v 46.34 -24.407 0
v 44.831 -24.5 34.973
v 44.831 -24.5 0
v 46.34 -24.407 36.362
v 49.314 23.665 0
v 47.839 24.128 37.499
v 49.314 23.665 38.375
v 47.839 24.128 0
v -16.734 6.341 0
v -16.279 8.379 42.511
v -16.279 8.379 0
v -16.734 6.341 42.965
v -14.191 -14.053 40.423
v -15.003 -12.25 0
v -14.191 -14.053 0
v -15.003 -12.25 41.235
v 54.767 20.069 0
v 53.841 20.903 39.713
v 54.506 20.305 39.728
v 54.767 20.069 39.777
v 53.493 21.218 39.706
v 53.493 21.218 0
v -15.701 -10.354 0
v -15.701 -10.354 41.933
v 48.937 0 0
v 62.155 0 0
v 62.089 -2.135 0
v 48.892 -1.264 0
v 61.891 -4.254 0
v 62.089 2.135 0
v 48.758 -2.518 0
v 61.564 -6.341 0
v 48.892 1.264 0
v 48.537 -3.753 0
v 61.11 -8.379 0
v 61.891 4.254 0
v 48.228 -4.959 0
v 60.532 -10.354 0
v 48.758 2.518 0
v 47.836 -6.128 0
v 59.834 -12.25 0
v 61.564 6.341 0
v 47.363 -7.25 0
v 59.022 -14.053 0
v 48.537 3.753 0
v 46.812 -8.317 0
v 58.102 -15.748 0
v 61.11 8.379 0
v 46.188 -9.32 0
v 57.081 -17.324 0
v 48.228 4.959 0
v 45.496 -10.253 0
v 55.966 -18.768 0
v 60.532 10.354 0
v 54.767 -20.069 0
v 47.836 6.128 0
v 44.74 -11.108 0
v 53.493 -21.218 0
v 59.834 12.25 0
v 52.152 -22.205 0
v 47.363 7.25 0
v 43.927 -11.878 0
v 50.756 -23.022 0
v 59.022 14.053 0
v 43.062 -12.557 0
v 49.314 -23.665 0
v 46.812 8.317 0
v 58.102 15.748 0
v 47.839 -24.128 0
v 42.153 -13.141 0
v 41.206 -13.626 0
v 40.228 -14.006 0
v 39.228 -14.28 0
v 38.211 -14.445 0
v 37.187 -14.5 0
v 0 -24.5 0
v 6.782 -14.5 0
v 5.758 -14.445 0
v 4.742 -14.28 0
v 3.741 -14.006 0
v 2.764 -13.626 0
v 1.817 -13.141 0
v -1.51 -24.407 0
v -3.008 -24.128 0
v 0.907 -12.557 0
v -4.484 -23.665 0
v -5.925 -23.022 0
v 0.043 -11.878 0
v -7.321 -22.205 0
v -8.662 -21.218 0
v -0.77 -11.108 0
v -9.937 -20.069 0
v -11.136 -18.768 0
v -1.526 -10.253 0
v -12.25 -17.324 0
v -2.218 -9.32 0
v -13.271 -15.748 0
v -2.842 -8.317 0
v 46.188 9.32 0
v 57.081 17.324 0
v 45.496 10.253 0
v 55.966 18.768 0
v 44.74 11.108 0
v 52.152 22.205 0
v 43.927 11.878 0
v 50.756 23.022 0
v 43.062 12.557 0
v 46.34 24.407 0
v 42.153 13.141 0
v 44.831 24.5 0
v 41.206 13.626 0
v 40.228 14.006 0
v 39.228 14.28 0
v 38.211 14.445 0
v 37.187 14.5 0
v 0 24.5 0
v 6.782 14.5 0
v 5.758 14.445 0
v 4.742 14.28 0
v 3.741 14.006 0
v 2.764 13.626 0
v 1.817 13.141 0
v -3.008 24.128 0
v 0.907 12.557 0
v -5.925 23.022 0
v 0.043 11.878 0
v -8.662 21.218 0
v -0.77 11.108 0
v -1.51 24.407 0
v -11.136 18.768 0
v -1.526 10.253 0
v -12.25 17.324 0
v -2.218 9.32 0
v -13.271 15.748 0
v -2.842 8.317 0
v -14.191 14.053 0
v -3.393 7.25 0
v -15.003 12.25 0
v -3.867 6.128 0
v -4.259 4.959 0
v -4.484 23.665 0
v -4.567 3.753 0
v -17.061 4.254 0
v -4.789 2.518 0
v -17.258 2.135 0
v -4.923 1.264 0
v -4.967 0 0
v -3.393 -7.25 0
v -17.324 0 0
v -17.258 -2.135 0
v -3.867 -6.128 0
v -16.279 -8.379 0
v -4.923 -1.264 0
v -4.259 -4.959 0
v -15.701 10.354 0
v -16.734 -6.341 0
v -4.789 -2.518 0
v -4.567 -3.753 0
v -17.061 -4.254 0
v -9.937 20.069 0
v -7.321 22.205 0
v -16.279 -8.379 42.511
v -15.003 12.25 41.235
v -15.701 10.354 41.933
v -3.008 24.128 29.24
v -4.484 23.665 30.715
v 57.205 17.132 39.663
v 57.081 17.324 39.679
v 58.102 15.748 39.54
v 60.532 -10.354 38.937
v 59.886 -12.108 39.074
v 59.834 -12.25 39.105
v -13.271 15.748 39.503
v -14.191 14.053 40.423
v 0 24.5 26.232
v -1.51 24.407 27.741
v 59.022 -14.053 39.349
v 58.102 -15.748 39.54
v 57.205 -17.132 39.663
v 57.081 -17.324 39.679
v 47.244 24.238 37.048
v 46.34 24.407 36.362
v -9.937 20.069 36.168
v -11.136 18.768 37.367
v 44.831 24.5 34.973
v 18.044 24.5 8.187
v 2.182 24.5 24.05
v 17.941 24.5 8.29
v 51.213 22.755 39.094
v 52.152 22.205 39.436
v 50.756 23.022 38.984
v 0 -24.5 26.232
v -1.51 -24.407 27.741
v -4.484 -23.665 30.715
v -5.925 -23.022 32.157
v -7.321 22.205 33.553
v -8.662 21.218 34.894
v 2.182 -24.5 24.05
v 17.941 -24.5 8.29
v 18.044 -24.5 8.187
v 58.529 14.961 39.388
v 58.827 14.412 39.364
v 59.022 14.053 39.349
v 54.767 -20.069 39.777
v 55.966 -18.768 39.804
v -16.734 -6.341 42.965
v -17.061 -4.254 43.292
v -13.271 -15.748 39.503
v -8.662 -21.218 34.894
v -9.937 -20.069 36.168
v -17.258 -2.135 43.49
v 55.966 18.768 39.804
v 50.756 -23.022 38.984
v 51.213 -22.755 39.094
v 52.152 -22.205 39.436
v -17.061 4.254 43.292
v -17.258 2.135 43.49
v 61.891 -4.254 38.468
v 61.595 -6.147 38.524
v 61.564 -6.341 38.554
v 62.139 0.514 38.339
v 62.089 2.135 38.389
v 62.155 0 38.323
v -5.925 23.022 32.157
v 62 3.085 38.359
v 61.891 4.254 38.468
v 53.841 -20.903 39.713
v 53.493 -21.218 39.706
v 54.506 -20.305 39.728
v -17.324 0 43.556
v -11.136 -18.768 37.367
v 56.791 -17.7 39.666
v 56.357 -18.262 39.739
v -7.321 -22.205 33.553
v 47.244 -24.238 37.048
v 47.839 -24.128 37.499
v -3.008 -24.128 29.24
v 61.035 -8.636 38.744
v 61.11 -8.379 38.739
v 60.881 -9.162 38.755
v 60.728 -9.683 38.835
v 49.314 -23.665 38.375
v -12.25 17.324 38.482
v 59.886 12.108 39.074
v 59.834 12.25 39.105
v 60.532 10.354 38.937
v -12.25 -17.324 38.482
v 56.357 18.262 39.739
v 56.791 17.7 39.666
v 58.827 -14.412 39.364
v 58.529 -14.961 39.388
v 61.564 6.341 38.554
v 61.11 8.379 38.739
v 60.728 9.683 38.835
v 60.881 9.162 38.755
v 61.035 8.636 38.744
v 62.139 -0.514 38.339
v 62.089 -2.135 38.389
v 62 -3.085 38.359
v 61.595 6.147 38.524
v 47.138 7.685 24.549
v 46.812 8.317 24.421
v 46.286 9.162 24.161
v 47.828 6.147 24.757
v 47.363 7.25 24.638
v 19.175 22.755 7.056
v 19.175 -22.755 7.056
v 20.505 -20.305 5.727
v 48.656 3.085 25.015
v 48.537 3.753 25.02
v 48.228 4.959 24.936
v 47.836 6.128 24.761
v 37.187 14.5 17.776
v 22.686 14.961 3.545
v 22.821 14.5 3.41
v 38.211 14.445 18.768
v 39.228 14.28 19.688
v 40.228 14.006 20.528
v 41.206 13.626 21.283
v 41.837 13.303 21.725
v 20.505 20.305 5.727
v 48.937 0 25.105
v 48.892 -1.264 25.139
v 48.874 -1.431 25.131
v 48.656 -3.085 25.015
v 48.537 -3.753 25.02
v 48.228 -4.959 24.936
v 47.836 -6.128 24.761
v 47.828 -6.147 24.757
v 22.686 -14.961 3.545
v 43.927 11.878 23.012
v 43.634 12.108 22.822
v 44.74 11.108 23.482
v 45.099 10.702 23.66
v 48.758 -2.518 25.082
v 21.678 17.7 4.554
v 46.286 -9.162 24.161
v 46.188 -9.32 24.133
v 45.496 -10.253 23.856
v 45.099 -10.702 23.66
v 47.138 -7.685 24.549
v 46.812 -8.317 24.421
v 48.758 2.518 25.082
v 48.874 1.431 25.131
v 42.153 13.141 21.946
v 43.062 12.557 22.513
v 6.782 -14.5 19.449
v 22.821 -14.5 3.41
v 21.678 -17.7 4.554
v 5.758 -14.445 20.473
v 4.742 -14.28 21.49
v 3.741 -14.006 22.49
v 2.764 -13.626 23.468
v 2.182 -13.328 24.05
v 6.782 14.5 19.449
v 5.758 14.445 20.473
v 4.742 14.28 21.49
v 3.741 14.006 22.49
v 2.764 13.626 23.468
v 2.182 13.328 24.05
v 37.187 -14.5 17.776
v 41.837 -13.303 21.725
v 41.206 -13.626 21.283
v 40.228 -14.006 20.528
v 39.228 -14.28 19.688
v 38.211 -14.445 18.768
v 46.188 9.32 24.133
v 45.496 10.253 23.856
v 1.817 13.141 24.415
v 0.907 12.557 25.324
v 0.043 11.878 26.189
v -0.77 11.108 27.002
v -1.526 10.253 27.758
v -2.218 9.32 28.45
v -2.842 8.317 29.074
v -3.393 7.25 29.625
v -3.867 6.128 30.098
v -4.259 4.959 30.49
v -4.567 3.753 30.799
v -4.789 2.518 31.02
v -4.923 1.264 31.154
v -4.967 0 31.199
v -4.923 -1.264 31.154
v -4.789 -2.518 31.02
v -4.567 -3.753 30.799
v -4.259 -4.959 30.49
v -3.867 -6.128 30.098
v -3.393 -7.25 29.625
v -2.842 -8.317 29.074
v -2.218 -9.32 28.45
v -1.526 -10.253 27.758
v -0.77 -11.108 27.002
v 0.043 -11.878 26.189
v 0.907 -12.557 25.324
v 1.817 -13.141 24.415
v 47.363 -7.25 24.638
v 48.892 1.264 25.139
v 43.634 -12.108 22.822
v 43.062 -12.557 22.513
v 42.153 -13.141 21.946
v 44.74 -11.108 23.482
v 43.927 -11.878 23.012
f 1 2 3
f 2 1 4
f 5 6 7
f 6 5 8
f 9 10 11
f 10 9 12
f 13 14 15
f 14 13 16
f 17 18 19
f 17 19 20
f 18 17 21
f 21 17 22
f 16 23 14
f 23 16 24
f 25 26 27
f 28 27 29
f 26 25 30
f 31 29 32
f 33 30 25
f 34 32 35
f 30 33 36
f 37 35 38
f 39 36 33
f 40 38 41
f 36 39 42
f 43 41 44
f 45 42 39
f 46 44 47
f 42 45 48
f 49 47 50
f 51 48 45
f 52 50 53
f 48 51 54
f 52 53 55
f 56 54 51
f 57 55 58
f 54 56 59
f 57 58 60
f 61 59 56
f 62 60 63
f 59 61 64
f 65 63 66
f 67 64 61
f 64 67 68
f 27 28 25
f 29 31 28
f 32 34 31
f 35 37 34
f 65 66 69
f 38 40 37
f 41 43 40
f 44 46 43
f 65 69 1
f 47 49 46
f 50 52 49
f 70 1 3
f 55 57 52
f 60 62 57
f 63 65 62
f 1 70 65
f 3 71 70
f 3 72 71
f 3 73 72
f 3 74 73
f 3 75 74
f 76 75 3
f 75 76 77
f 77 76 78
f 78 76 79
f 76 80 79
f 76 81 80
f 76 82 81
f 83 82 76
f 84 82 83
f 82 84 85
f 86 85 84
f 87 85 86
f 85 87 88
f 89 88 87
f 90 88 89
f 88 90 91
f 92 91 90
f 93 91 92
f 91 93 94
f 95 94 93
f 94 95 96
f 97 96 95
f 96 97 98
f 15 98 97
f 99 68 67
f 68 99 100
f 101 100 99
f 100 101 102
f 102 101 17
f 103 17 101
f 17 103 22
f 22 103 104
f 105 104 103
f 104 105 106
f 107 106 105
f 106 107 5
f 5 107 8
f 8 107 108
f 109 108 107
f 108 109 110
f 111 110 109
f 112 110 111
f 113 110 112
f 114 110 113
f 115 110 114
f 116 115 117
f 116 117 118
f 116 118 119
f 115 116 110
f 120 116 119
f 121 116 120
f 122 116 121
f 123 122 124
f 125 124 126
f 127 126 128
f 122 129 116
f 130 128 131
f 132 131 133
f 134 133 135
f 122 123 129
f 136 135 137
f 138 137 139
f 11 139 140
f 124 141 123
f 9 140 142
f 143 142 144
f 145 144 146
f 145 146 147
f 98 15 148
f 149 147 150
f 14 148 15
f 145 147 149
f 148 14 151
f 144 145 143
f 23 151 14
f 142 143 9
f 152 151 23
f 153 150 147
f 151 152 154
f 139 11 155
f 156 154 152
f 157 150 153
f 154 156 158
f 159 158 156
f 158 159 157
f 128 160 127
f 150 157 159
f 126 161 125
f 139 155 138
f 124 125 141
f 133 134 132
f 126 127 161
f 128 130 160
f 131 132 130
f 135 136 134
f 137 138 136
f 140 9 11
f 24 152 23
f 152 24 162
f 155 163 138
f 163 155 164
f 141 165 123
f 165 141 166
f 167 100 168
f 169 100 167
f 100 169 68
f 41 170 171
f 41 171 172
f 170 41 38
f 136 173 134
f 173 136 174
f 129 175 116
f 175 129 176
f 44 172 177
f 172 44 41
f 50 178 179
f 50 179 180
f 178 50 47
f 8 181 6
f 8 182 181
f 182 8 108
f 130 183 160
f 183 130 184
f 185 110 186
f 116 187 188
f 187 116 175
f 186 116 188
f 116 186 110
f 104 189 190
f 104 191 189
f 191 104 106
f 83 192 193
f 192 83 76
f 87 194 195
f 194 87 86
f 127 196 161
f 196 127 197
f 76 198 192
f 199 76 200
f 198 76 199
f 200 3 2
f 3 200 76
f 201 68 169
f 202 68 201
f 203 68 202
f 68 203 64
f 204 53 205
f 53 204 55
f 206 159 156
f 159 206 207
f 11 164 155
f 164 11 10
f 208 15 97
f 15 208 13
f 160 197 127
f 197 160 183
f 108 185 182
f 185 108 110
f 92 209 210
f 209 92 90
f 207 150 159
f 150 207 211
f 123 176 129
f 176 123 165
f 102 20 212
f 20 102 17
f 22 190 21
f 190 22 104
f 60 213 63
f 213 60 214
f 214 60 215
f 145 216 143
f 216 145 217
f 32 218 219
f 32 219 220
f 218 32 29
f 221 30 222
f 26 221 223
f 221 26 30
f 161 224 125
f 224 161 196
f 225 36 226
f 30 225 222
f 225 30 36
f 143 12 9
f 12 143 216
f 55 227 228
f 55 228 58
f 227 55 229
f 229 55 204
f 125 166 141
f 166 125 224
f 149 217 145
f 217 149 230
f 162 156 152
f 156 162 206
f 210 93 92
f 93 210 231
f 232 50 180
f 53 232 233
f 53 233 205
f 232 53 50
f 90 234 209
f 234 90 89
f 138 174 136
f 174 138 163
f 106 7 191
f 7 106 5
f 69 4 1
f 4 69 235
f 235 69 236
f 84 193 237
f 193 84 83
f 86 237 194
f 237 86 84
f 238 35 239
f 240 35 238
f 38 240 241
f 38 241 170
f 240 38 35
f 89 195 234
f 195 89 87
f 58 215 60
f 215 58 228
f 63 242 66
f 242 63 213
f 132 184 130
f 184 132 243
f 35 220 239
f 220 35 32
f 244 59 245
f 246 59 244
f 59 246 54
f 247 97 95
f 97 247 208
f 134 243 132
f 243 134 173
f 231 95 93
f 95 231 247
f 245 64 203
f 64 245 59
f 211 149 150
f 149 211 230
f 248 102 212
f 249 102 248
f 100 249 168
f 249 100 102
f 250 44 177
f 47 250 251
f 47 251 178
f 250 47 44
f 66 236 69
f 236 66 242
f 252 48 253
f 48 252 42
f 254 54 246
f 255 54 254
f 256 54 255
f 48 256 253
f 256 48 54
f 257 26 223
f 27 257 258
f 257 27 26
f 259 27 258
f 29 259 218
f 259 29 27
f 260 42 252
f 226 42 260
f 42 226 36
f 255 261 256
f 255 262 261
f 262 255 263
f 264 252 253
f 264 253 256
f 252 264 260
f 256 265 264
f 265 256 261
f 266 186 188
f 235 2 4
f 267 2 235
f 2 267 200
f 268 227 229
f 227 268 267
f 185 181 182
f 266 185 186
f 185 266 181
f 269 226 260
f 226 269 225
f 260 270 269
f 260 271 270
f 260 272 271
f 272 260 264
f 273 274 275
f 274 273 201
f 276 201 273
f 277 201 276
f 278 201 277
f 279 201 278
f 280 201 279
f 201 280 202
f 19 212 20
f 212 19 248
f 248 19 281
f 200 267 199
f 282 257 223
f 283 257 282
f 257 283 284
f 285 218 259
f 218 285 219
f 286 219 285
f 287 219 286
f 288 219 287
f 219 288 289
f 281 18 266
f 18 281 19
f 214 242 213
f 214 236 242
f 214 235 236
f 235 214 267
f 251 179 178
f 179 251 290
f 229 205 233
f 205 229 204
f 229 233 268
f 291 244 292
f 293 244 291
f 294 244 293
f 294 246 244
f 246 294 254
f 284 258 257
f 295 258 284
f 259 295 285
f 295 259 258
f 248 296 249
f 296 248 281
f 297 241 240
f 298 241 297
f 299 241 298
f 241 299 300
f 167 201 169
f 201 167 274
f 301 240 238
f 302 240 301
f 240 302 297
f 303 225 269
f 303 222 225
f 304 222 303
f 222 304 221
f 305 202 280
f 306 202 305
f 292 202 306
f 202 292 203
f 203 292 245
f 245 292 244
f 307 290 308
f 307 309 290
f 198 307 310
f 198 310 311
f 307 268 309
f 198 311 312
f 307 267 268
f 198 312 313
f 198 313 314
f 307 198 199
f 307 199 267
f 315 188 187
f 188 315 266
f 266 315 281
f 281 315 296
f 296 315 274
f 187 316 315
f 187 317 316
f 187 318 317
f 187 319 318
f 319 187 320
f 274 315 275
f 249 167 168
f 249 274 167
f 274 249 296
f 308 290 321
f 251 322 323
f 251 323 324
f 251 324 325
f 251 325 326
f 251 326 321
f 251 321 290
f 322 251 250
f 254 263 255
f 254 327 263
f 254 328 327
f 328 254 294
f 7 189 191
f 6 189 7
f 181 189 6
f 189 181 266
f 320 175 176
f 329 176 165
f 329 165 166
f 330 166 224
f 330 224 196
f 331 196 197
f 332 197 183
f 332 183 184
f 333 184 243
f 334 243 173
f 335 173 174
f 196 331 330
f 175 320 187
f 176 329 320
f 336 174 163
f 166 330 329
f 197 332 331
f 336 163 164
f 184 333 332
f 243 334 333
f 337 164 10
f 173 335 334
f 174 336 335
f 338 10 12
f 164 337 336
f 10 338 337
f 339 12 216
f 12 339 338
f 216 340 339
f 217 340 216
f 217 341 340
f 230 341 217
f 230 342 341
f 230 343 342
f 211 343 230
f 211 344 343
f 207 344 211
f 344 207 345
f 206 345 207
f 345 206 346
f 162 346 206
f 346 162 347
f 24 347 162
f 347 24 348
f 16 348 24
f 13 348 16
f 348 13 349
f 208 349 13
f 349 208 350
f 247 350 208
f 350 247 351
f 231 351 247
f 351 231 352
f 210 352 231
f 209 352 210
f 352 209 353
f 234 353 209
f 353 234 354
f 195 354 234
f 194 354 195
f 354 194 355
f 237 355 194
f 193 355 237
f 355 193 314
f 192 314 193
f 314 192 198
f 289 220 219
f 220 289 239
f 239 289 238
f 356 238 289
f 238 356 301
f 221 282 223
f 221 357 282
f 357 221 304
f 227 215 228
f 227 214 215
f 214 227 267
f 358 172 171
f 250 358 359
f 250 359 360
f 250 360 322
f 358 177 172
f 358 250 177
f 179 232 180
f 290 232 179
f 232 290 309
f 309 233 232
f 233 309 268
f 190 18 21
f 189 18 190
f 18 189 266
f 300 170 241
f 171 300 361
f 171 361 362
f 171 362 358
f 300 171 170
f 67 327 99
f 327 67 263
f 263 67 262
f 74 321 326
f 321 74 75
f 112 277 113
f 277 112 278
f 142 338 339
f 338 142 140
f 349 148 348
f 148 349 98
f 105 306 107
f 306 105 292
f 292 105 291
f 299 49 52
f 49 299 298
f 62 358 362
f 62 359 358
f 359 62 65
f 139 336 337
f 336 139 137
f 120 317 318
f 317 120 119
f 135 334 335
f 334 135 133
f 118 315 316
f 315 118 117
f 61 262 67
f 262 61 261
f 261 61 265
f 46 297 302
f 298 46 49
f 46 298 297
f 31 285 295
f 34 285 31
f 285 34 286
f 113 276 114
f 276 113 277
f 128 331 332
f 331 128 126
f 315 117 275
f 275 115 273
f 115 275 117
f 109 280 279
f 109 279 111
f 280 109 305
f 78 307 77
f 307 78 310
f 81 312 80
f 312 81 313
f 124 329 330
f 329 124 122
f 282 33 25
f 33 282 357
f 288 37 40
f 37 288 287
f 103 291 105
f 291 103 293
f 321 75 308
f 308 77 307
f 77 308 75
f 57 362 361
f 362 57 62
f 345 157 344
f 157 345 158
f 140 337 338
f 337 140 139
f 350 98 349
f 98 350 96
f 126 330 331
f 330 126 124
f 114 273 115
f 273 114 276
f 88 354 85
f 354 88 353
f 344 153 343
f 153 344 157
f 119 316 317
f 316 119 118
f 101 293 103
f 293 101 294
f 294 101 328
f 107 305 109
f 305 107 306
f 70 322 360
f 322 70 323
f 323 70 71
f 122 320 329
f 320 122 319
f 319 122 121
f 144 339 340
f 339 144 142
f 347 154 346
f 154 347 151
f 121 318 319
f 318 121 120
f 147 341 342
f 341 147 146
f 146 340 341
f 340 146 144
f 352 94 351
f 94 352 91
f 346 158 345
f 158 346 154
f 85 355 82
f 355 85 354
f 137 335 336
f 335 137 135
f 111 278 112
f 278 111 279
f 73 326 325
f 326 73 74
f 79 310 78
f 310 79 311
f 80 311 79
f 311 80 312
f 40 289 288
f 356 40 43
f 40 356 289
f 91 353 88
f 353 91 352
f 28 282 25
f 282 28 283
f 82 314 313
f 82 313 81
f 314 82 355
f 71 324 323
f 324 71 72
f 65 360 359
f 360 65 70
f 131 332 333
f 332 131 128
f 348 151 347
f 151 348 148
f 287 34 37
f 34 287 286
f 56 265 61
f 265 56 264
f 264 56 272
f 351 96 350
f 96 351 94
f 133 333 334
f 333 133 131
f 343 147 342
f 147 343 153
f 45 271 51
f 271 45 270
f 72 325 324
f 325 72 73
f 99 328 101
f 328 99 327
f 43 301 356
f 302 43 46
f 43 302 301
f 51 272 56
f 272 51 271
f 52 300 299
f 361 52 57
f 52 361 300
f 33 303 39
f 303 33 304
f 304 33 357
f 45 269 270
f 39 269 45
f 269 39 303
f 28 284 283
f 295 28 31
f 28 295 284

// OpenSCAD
// -*- mode: SCAD ; c-file-style: "ellemtel" ; coding: utf-8 -*-
//
// A wedge to keep a glass angled.
//
// This is a re-imagining of Thing 2784800, matt sauter's "Whiskey Wedge -
// Angled Ice". (https://www.thingiverse.com/thing:2784800) This is not
// based on that thing, but a new thing to achieve the same effect.
//
// Copyright 2018 Roland Sieker <ospalh@gmail.com>
// Licence: CC-BY-SA 4.0

// How wide the glass to put on this is
glass_diameter = 70; // [30:1:100]

// ... and how tall.
glass_height = 90; // [20:1:200]

// Angle at which the glass rests
angle = 45; // [20:1:70]

// Width of the wedge as a percentage of the glass diameter
wedge_width = 70; // [50:1:99]

// Length of the wedge as a percentage of the glass height
wedge_length = 70; // [50:1:99]

// Distance between the outside and the hole in the inside. The width of the wedge.
wedge_cutout_width = 10; // [3:0.5:30]

// Set this to "render" and click on "Create Thing" when done with the setup.
preview = 1; // [0:render, 1:preview]



/* [Hidden] */

// Done with the customizer

// *******************************************************
// Extra parameters. These can be changed reasonably safely.


w = 1.8;  // Wall width. Not used here, i think.
p = 1.2;  // Bottom, top plate height. In this case, distance of the glass from the freezer floor
c = 0.4;  // Clearance

// *******************************************************
// Some shortcuts. These shouldn't be changed

r_ge = glass_diameter/2 + c;
r_w = glass_diameter/2 * wedge_width/100;

tau = 2 * PI;  // pi is still wrong

gh = glass_height*wedge_length/100;

xy_factor = 1/tan(angle);
// To get from a height to a horizontal width inclined correctly
z_factor = tan(angle);  // The other way around
hb = gh*sin(angle);


ms = 0.01;  // Muggeseggele.

// fn for differently sized objects and fs, fa; all for preview or rendering.
pna = 40;
pnb = 15;
pa = 5;
ps = 1;
rna = 180;
rnb = 30;
ra = 1;
rs = 0.1;
function na() = (preview) ? pna : rna;
function nb() = (preview) ? pnb : rnb;
$fs = (preview) ? ps : rs;
$fa = (preview) ? pa : ra;

// *******************************************************
// End setup



// *******************************************************
// Generate the part

glass_wedge();

// *******************************************************
// Code for the part itself


module glass_wedge()
{
   hc = r_ge*sin(angle) + p;
   difference()
   {
      glass_base();
      translate([0,0, hc])
      {
         glass_cutout();
      }
      inner_cutout();
   }
}

module glass_cutout()
{
   rotate([0,angle,0])
   {
      hull()
      {
         cylinder(r=r_ge, h=gh);
         translate([-r_ge-gh,0,0])
         {
            cylinder(r=r_ge, h=2*gh);
         }
      }
   }

}

module glass_base()
{
   linear_extrude(hb)
   {
      2d_glass_base();
   }
}



module 2d_glass_base()
{
   projection()
   {
      rotate([0,angle,0])
      {
         cylinder(r=r_w, h=gh+c);
      }
   }
}

module inner_cutout()
{
   translate([0,0,-ms])
   {
      linear_extrude(hb+2*ms)
      {
         2d_inner_cutout();
      }
   }
}

module 2d_inner_cutout()
{
   sy = (r_w-wedge_cutout_width)/r_w;
   lh = cos(angle)*(gh+c);
   lx = sin(angle)*r_w+lh;
   sx = (lx-2*wedge_cutout_width)/lx;

   // I think this is not really correct (or the way i wanted it), but,
   // meh, good enough.
   translate([sx*wedge_cutout_width,0])
   {
      scale([sx,sy])
      {
         2d_glass_base();
      }
   }
}
